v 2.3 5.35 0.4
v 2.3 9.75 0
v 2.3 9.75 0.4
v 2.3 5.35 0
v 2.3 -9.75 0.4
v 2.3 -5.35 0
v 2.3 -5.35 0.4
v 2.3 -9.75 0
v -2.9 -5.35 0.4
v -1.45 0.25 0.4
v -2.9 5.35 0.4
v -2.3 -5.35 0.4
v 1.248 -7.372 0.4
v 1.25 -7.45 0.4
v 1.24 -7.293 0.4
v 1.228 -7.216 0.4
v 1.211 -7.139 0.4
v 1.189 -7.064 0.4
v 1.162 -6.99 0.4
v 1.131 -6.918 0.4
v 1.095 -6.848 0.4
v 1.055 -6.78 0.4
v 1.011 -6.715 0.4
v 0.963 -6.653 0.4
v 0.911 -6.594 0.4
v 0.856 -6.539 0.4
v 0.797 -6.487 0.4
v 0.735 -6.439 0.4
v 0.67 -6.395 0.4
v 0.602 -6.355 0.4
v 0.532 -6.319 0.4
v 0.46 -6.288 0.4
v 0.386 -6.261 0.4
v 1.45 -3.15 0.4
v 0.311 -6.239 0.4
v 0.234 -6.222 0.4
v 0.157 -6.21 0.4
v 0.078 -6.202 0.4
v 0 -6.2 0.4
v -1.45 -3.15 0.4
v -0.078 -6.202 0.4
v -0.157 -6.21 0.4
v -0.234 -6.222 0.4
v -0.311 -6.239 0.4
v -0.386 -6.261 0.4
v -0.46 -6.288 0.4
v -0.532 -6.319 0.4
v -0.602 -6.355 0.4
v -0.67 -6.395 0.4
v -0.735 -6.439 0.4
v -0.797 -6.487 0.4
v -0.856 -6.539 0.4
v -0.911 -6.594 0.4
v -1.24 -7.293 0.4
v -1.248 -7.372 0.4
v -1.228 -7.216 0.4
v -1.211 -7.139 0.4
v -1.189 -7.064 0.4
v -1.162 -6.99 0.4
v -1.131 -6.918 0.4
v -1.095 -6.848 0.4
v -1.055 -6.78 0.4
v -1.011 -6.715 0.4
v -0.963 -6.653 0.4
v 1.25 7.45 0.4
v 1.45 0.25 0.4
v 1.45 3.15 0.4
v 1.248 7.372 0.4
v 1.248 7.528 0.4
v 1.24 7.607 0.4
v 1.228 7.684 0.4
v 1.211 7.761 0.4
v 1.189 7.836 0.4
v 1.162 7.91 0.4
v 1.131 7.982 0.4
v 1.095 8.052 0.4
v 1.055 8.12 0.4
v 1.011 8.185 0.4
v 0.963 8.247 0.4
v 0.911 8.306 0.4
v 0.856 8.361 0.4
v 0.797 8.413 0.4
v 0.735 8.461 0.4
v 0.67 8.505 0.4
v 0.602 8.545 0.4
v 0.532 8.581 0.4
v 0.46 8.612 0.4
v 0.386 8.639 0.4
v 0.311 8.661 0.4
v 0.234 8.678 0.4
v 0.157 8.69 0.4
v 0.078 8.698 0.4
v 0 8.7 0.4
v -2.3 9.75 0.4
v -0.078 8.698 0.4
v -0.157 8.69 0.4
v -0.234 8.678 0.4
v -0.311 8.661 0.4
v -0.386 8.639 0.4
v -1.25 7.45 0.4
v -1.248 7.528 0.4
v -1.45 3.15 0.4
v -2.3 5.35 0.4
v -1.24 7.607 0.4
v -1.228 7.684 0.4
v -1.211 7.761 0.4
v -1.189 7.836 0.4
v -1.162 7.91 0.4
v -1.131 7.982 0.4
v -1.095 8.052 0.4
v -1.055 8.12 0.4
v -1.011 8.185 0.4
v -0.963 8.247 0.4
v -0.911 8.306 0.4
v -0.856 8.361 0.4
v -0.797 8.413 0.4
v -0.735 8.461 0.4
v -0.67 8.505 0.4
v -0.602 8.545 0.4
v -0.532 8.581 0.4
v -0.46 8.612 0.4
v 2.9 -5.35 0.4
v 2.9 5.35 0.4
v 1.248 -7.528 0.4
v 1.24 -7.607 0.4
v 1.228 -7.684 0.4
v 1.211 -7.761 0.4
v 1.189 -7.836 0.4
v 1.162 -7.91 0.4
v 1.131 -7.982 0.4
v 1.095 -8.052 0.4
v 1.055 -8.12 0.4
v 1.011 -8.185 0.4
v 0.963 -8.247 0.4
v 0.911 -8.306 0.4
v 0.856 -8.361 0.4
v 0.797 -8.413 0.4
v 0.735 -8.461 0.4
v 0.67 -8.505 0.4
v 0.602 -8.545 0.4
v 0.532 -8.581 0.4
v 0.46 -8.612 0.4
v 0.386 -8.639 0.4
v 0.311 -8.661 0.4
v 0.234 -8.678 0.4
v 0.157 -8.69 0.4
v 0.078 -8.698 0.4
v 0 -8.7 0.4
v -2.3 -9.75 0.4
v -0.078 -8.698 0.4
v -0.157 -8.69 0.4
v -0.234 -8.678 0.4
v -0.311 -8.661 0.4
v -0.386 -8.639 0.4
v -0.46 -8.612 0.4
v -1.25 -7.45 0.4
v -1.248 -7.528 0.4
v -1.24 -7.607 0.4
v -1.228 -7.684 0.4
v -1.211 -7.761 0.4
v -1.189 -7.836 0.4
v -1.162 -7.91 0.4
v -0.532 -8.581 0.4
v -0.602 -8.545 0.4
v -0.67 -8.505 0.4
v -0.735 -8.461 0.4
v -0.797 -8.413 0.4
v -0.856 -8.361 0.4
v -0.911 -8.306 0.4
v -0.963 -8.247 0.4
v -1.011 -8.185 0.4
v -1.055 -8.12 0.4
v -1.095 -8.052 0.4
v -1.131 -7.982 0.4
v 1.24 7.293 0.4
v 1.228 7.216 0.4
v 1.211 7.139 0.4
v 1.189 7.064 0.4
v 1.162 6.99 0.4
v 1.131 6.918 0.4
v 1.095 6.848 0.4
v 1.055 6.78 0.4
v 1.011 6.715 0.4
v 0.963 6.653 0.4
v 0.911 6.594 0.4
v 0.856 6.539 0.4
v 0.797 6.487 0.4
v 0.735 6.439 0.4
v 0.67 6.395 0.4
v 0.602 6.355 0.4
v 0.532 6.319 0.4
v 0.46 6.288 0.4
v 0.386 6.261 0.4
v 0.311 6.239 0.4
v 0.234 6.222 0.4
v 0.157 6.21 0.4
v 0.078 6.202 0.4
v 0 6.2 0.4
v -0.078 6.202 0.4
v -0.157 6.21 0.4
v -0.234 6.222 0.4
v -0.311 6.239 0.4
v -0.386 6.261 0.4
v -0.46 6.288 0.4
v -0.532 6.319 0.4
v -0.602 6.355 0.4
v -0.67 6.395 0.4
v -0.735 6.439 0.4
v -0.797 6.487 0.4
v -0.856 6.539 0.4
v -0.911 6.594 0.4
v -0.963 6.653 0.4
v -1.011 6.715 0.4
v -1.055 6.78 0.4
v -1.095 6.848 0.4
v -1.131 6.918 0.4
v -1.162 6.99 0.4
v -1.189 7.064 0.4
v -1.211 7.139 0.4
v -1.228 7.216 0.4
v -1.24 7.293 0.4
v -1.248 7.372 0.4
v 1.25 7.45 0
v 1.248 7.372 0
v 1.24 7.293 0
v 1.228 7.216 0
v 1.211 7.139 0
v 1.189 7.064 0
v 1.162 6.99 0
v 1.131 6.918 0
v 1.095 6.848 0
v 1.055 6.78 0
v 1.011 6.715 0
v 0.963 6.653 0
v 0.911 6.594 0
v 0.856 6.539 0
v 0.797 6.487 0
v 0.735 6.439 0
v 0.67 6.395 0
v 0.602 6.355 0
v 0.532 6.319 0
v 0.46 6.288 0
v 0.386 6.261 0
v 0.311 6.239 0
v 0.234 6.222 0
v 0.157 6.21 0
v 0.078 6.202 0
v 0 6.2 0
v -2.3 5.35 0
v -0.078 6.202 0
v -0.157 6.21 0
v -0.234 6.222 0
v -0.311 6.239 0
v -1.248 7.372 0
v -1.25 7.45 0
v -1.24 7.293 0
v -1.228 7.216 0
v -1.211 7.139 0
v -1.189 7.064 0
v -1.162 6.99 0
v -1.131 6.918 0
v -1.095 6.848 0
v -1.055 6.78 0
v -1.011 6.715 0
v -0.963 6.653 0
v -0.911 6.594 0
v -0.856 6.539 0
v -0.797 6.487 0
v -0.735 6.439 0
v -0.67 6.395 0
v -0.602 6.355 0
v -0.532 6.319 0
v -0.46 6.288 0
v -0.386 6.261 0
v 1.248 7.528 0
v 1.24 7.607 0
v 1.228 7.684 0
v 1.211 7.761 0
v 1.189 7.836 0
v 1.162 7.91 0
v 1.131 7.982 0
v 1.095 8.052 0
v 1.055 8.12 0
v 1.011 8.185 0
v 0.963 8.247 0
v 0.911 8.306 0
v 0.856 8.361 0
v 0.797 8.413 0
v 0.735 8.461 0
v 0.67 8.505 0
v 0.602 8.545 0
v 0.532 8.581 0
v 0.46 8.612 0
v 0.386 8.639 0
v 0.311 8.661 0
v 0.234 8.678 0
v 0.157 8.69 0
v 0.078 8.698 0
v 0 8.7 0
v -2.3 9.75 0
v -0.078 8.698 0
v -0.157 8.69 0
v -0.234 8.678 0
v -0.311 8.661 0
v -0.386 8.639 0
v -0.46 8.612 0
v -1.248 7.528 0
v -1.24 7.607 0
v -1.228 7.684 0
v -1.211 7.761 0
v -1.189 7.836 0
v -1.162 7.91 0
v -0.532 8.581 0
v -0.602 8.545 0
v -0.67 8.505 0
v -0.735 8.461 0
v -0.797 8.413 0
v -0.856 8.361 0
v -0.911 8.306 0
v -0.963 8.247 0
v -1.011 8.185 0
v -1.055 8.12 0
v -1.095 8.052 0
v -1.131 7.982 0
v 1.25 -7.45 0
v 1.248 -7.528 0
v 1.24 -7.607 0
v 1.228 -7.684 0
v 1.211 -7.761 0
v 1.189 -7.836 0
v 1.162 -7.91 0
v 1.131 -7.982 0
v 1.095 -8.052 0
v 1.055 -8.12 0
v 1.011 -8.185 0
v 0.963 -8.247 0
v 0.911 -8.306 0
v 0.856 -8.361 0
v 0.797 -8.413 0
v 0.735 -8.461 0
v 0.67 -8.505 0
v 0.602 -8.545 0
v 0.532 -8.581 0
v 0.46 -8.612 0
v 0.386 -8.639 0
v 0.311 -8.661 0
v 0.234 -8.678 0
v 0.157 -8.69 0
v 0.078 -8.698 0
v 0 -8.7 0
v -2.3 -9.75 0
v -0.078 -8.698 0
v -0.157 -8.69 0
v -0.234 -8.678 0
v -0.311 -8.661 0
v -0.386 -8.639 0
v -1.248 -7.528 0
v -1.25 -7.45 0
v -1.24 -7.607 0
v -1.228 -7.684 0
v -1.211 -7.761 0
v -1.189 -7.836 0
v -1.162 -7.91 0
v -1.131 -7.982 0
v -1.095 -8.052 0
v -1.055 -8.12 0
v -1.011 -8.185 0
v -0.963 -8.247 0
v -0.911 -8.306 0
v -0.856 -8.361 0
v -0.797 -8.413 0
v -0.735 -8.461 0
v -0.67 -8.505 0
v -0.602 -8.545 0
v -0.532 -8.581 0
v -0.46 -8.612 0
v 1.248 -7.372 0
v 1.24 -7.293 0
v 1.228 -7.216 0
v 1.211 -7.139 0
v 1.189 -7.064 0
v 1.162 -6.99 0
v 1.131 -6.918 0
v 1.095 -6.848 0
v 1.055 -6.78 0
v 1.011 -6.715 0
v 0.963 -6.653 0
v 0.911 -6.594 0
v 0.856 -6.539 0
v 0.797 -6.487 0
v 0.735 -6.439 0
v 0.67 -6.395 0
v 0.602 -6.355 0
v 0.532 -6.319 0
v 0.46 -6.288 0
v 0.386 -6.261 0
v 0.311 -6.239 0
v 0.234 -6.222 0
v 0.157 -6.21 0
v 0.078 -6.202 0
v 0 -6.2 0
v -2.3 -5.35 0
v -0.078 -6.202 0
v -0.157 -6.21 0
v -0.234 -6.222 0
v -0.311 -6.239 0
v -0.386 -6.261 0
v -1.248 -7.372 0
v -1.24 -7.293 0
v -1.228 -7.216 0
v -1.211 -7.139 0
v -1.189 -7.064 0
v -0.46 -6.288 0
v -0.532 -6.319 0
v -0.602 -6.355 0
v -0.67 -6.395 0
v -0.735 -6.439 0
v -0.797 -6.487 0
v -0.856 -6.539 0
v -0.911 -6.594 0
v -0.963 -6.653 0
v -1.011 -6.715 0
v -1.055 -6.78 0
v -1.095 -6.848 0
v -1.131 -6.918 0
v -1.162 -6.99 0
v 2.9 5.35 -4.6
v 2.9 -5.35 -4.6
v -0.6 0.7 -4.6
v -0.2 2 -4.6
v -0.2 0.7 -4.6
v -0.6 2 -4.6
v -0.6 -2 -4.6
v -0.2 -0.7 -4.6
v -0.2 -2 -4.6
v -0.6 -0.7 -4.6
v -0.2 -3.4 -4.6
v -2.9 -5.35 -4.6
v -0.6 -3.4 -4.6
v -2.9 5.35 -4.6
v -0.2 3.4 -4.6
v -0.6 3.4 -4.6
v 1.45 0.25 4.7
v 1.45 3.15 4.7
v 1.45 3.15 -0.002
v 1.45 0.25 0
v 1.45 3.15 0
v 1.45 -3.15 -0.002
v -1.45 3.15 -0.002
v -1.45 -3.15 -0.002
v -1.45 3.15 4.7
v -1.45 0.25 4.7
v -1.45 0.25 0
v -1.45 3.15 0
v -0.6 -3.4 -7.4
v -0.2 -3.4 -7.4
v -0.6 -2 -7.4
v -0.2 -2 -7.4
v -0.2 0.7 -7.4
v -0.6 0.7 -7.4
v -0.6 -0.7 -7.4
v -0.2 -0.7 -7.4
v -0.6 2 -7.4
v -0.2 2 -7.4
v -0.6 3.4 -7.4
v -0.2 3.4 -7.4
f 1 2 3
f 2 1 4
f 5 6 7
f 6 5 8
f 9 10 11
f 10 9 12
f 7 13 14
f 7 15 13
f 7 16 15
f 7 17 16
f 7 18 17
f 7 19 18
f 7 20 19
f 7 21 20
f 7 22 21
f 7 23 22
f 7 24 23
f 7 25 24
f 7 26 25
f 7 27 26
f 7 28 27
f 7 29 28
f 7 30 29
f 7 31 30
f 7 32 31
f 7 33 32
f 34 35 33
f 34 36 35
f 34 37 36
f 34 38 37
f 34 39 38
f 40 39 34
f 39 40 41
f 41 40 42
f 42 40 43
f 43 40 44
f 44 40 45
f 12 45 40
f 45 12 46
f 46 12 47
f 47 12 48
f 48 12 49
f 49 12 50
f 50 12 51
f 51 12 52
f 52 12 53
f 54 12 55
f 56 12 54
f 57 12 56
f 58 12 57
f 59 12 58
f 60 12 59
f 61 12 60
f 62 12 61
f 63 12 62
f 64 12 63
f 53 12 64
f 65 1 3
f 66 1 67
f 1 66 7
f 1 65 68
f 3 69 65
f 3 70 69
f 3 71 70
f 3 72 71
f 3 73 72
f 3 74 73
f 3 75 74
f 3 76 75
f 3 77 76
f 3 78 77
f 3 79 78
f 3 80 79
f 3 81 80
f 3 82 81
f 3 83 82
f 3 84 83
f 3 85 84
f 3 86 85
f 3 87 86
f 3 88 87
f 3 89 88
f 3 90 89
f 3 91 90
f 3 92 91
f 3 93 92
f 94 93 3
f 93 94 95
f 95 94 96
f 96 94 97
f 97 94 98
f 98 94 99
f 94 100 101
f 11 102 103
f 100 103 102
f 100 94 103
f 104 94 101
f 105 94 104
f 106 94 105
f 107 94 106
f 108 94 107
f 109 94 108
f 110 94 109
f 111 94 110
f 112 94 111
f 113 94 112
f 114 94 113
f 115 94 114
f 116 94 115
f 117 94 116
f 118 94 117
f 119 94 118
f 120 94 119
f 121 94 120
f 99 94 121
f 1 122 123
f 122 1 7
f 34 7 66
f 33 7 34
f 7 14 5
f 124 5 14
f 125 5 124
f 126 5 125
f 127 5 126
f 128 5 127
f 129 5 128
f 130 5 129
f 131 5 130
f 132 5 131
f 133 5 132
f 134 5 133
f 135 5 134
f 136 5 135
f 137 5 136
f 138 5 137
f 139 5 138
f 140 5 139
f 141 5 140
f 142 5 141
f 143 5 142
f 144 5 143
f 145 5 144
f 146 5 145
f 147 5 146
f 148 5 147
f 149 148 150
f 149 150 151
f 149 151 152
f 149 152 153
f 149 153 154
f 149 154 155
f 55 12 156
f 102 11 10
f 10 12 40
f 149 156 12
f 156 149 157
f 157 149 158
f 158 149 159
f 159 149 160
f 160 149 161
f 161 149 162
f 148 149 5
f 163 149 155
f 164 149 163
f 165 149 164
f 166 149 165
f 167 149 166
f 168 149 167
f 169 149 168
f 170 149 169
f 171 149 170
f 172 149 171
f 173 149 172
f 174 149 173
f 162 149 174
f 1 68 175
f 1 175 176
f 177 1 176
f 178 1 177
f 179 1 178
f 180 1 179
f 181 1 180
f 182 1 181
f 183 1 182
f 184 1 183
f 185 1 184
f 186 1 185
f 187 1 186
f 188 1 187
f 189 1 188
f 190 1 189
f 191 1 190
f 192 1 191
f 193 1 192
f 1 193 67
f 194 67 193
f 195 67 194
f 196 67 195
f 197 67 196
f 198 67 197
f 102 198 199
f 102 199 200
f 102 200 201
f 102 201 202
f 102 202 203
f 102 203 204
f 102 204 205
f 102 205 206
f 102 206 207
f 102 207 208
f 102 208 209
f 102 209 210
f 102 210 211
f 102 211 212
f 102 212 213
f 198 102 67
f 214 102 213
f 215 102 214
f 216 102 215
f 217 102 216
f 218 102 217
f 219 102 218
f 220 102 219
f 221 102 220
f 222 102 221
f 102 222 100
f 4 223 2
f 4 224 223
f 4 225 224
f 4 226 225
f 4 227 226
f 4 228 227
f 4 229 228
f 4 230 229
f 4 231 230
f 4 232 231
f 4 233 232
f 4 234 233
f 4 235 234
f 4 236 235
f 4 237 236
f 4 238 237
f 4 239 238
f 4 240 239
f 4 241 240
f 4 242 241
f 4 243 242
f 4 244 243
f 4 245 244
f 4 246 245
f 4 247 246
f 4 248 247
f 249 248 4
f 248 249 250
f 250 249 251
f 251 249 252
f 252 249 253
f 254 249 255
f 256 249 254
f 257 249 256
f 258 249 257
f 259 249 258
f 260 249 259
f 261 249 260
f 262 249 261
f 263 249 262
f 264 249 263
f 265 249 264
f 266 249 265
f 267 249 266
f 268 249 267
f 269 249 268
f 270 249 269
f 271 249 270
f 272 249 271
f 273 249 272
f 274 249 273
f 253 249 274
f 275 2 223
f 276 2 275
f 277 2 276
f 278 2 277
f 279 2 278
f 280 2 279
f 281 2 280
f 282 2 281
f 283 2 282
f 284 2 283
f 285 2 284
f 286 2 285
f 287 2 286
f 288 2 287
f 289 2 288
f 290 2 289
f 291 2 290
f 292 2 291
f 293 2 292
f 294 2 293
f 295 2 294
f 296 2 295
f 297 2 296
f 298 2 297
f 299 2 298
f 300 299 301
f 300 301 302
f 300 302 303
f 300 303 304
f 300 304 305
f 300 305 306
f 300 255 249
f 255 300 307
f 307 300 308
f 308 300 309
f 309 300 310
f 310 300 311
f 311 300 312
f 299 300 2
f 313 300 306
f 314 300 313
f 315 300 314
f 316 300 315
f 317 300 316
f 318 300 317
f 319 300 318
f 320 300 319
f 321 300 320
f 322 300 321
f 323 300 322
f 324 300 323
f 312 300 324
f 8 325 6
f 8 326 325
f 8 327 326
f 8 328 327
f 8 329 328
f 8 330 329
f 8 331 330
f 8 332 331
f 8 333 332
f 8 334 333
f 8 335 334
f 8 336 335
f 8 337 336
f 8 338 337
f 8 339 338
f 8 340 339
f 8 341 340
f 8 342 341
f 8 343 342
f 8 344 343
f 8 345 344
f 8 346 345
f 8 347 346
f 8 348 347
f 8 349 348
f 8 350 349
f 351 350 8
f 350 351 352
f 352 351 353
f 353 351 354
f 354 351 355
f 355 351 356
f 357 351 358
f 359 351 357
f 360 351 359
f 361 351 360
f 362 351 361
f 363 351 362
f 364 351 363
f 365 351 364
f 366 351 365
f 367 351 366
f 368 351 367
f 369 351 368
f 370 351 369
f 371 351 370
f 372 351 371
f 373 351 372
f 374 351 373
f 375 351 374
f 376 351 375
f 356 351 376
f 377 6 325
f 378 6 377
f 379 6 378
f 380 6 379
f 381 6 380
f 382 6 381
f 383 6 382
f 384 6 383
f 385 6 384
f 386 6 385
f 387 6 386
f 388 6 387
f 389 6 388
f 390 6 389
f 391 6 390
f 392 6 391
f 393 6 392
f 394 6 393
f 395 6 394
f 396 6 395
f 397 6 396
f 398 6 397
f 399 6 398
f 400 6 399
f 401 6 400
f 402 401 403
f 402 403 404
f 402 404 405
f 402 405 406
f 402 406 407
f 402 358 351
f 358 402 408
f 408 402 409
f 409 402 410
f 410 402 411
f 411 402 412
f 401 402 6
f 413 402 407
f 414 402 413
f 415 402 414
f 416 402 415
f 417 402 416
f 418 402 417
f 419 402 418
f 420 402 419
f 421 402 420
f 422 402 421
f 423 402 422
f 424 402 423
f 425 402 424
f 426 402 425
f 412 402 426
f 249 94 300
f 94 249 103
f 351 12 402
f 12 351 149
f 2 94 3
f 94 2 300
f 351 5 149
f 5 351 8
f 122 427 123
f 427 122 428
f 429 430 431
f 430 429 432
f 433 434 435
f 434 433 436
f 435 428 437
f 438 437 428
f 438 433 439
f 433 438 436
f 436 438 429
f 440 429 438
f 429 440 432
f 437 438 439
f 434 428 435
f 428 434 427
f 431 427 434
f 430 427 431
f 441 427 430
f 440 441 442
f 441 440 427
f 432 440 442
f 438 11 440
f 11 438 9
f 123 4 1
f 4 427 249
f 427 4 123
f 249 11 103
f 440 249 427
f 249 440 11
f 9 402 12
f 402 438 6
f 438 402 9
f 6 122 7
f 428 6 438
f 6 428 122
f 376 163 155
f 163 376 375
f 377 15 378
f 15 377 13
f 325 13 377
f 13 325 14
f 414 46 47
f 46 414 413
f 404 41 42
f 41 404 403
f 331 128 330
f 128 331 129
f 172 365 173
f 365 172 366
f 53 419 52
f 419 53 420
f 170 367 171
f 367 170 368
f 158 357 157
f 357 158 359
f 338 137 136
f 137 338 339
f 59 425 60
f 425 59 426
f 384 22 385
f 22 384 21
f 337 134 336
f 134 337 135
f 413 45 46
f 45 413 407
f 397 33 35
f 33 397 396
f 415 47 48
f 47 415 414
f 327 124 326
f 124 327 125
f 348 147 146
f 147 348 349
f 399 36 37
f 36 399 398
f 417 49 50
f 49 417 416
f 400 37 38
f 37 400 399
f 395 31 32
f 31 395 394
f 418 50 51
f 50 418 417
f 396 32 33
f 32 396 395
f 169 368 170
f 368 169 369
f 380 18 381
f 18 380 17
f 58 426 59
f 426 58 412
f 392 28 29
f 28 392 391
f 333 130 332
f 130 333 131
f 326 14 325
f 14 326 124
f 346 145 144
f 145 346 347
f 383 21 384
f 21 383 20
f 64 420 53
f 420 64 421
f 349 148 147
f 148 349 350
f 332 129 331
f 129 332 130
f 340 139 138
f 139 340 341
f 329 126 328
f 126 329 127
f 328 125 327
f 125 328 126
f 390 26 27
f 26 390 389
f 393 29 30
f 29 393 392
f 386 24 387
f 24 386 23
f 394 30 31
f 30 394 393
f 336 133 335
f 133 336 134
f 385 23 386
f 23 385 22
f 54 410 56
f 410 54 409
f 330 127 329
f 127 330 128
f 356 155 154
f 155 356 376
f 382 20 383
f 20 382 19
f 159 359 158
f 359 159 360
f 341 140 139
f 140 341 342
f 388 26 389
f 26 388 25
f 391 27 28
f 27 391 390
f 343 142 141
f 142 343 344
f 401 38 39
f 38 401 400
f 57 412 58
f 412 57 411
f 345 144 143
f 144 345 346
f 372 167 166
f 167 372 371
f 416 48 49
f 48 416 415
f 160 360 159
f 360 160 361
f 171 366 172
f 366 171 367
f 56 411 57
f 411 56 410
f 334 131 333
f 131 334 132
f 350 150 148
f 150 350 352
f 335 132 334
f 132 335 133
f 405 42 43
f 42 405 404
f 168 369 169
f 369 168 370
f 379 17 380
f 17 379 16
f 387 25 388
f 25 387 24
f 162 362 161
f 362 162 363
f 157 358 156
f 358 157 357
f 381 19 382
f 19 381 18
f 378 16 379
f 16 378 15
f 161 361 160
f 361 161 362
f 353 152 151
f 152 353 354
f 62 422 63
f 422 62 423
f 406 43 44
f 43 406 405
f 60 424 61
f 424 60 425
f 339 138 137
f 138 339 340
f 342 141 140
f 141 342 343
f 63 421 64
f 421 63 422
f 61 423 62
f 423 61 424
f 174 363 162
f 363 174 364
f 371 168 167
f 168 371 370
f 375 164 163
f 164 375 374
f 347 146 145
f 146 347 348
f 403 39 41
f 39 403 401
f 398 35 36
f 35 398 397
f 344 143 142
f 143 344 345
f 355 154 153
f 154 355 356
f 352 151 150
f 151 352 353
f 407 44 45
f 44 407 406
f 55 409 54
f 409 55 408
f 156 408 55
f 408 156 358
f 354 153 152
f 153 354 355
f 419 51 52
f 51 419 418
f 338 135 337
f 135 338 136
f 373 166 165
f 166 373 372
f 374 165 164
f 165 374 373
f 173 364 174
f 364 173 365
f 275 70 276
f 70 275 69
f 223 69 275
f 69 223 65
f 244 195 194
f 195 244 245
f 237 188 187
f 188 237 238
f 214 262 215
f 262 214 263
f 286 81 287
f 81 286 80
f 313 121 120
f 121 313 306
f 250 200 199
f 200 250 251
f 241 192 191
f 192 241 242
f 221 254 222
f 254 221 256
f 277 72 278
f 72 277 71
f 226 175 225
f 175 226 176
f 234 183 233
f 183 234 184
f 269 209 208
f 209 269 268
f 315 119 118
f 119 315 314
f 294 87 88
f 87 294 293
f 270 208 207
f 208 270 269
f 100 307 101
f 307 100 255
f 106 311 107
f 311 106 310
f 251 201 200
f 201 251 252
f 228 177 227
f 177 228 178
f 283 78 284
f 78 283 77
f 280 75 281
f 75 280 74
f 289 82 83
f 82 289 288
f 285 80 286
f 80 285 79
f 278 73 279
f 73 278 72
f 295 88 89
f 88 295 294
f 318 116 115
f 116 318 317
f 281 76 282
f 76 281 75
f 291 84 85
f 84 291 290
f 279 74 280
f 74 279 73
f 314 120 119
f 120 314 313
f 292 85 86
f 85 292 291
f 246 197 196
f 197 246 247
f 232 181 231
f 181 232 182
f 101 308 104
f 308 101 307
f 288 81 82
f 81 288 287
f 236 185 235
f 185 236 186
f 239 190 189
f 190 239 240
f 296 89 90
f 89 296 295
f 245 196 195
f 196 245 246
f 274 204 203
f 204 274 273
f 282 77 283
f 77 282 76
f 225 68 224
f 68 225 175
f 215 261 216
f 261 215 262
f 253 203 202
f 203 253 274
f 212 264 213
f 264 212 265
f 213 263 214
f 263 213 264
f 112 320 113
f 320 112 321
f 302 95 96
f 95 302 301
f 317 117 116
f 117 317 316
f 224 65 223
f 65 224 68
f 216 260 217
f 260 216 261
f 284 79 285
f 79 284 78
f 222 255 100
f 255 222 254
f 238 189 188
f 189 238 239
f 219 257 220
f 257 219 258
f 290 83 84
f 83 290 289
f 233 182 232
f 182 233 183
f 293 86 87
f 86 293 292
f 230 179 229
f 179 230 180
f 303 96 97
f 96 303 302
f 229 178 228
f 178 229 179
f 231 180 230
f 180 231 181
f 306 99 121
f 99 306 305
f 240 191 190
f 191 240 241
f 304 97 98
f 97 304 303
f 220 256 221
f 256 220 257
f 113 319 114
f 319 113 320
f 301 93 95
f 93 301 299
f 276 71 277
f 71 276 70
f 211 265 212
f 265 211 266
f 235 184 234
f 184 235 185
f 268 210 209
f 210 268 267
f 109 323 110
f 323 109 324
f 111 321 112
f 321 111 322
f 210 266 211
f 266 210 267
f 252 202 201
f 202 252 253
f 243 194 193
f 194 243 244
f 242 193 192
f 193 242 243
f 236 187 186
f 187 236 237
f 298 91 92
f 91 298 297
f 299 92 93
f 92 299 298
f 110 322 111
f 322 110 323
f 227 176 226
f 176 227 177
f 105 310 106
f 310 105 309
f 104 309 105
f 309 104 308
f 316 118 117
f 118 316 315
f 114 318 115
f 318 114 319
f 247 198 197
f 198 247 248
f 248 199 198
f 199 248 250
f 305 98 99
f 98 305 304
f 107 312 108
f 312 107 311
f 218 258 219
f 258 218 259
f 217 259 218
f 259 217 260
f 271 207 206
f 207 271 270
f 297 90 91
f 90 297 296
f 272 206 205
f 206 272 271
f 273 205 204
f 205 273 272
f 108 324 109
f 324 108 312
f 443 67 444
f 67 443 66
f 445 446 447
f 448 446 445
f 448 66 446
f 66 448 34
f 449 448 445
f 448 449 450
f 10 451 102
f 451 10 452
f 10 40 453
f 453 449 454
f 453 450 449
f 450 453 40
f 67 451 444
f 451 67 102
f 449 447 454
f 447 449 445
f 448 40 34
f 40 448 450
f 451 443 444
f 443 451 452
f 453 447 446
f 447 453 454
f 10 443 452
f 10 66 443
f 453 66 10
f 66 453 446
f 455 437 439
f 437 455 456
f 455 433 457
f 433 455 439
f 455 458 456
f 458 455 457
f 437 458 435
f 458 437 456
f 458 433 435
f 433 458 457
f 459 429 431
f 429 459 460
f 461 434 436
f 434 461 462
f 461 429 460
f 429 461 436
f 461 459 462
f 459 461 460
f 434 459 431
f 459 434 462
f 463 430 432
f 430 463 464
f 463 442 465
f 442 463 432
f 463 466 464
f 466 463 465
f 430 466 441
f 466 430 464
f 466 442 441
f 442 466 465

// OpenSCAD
$fn = 100;

Slider =  [2.9, 2.9, 4.7];
Slide_Distance = 6.3;
Plate = [4.6, 19.5, 0.4];
Plate_Holes_Diameter = 2.5;
Body = [5.8, 10.7, 5.0];
Pins = [1.4, 0.4, 2.8];
Pins_Distance = 2.7;

e = 0.005;

Slide_Switch("#222", "#888");

module Slide_Switch(switch_color, metal_color, negative = false, backlash = 0.2) {
  b = negative ? backlash : 0;
  bc = negative ? backlash * 10 : 0;
  color(switch_color) {
    // Slider
    translate([-Slider[0] / 2, Slide_Distance / 2 - Slider[1], 0])
      cube(Slider);
    // Body and Plate
    difference() {
      union() {
        translate([-Plate[0] / 2, -Plate[1] / 2, 0])
          cube(Plate);
        translate([-(Body[0] + b) / 2, -(Body[1] + b) / 2, -Body[2] + Plate[2] - bc])
          cube([Body[0] + b, Body[1] + b, Body[2] + bc]);
      }
      if (!negative) {
        translate([-Slider[0] / 2, -Slide_Distance / 2, -e / 2])
          cube([Slider[0], Slide_Distance, Plate[2] + e]);
        for (i = [-1, 1])
          translate([0, i * (Plate[1] - Plate[0]) / 2, -e / 2])
            cylinder(Plate[2] + e, d = Plate_Holes_Diameter);
      }
    }
  }

  // Pins
  color(metal_color) {
    for (i = [-1, 0, 1])
      translate([-Pins[1] / 2, -Pins[0] / 2 + i * Pins_Distance, Plate[2] - Body[2] - Pins[2]])
        rotate([0, 0, 90])
          cube(Pins);
  }

  // Screw Holes in Case
  if (negative) {
      for (i = [-1, 1])
        translate([0, i * (Plate[1] - Plate[0]) / 2, -Body[2]])
          cylinder(Body[2] + e, d = Plate_Holes_Diameter);
  }
}

function Slide_Switch_Screw_Hole_Distance() = Plate[1] - Plate[0];
function Slide_Switch_Screw_Diameter() = Plate_Holes_Diameter;
